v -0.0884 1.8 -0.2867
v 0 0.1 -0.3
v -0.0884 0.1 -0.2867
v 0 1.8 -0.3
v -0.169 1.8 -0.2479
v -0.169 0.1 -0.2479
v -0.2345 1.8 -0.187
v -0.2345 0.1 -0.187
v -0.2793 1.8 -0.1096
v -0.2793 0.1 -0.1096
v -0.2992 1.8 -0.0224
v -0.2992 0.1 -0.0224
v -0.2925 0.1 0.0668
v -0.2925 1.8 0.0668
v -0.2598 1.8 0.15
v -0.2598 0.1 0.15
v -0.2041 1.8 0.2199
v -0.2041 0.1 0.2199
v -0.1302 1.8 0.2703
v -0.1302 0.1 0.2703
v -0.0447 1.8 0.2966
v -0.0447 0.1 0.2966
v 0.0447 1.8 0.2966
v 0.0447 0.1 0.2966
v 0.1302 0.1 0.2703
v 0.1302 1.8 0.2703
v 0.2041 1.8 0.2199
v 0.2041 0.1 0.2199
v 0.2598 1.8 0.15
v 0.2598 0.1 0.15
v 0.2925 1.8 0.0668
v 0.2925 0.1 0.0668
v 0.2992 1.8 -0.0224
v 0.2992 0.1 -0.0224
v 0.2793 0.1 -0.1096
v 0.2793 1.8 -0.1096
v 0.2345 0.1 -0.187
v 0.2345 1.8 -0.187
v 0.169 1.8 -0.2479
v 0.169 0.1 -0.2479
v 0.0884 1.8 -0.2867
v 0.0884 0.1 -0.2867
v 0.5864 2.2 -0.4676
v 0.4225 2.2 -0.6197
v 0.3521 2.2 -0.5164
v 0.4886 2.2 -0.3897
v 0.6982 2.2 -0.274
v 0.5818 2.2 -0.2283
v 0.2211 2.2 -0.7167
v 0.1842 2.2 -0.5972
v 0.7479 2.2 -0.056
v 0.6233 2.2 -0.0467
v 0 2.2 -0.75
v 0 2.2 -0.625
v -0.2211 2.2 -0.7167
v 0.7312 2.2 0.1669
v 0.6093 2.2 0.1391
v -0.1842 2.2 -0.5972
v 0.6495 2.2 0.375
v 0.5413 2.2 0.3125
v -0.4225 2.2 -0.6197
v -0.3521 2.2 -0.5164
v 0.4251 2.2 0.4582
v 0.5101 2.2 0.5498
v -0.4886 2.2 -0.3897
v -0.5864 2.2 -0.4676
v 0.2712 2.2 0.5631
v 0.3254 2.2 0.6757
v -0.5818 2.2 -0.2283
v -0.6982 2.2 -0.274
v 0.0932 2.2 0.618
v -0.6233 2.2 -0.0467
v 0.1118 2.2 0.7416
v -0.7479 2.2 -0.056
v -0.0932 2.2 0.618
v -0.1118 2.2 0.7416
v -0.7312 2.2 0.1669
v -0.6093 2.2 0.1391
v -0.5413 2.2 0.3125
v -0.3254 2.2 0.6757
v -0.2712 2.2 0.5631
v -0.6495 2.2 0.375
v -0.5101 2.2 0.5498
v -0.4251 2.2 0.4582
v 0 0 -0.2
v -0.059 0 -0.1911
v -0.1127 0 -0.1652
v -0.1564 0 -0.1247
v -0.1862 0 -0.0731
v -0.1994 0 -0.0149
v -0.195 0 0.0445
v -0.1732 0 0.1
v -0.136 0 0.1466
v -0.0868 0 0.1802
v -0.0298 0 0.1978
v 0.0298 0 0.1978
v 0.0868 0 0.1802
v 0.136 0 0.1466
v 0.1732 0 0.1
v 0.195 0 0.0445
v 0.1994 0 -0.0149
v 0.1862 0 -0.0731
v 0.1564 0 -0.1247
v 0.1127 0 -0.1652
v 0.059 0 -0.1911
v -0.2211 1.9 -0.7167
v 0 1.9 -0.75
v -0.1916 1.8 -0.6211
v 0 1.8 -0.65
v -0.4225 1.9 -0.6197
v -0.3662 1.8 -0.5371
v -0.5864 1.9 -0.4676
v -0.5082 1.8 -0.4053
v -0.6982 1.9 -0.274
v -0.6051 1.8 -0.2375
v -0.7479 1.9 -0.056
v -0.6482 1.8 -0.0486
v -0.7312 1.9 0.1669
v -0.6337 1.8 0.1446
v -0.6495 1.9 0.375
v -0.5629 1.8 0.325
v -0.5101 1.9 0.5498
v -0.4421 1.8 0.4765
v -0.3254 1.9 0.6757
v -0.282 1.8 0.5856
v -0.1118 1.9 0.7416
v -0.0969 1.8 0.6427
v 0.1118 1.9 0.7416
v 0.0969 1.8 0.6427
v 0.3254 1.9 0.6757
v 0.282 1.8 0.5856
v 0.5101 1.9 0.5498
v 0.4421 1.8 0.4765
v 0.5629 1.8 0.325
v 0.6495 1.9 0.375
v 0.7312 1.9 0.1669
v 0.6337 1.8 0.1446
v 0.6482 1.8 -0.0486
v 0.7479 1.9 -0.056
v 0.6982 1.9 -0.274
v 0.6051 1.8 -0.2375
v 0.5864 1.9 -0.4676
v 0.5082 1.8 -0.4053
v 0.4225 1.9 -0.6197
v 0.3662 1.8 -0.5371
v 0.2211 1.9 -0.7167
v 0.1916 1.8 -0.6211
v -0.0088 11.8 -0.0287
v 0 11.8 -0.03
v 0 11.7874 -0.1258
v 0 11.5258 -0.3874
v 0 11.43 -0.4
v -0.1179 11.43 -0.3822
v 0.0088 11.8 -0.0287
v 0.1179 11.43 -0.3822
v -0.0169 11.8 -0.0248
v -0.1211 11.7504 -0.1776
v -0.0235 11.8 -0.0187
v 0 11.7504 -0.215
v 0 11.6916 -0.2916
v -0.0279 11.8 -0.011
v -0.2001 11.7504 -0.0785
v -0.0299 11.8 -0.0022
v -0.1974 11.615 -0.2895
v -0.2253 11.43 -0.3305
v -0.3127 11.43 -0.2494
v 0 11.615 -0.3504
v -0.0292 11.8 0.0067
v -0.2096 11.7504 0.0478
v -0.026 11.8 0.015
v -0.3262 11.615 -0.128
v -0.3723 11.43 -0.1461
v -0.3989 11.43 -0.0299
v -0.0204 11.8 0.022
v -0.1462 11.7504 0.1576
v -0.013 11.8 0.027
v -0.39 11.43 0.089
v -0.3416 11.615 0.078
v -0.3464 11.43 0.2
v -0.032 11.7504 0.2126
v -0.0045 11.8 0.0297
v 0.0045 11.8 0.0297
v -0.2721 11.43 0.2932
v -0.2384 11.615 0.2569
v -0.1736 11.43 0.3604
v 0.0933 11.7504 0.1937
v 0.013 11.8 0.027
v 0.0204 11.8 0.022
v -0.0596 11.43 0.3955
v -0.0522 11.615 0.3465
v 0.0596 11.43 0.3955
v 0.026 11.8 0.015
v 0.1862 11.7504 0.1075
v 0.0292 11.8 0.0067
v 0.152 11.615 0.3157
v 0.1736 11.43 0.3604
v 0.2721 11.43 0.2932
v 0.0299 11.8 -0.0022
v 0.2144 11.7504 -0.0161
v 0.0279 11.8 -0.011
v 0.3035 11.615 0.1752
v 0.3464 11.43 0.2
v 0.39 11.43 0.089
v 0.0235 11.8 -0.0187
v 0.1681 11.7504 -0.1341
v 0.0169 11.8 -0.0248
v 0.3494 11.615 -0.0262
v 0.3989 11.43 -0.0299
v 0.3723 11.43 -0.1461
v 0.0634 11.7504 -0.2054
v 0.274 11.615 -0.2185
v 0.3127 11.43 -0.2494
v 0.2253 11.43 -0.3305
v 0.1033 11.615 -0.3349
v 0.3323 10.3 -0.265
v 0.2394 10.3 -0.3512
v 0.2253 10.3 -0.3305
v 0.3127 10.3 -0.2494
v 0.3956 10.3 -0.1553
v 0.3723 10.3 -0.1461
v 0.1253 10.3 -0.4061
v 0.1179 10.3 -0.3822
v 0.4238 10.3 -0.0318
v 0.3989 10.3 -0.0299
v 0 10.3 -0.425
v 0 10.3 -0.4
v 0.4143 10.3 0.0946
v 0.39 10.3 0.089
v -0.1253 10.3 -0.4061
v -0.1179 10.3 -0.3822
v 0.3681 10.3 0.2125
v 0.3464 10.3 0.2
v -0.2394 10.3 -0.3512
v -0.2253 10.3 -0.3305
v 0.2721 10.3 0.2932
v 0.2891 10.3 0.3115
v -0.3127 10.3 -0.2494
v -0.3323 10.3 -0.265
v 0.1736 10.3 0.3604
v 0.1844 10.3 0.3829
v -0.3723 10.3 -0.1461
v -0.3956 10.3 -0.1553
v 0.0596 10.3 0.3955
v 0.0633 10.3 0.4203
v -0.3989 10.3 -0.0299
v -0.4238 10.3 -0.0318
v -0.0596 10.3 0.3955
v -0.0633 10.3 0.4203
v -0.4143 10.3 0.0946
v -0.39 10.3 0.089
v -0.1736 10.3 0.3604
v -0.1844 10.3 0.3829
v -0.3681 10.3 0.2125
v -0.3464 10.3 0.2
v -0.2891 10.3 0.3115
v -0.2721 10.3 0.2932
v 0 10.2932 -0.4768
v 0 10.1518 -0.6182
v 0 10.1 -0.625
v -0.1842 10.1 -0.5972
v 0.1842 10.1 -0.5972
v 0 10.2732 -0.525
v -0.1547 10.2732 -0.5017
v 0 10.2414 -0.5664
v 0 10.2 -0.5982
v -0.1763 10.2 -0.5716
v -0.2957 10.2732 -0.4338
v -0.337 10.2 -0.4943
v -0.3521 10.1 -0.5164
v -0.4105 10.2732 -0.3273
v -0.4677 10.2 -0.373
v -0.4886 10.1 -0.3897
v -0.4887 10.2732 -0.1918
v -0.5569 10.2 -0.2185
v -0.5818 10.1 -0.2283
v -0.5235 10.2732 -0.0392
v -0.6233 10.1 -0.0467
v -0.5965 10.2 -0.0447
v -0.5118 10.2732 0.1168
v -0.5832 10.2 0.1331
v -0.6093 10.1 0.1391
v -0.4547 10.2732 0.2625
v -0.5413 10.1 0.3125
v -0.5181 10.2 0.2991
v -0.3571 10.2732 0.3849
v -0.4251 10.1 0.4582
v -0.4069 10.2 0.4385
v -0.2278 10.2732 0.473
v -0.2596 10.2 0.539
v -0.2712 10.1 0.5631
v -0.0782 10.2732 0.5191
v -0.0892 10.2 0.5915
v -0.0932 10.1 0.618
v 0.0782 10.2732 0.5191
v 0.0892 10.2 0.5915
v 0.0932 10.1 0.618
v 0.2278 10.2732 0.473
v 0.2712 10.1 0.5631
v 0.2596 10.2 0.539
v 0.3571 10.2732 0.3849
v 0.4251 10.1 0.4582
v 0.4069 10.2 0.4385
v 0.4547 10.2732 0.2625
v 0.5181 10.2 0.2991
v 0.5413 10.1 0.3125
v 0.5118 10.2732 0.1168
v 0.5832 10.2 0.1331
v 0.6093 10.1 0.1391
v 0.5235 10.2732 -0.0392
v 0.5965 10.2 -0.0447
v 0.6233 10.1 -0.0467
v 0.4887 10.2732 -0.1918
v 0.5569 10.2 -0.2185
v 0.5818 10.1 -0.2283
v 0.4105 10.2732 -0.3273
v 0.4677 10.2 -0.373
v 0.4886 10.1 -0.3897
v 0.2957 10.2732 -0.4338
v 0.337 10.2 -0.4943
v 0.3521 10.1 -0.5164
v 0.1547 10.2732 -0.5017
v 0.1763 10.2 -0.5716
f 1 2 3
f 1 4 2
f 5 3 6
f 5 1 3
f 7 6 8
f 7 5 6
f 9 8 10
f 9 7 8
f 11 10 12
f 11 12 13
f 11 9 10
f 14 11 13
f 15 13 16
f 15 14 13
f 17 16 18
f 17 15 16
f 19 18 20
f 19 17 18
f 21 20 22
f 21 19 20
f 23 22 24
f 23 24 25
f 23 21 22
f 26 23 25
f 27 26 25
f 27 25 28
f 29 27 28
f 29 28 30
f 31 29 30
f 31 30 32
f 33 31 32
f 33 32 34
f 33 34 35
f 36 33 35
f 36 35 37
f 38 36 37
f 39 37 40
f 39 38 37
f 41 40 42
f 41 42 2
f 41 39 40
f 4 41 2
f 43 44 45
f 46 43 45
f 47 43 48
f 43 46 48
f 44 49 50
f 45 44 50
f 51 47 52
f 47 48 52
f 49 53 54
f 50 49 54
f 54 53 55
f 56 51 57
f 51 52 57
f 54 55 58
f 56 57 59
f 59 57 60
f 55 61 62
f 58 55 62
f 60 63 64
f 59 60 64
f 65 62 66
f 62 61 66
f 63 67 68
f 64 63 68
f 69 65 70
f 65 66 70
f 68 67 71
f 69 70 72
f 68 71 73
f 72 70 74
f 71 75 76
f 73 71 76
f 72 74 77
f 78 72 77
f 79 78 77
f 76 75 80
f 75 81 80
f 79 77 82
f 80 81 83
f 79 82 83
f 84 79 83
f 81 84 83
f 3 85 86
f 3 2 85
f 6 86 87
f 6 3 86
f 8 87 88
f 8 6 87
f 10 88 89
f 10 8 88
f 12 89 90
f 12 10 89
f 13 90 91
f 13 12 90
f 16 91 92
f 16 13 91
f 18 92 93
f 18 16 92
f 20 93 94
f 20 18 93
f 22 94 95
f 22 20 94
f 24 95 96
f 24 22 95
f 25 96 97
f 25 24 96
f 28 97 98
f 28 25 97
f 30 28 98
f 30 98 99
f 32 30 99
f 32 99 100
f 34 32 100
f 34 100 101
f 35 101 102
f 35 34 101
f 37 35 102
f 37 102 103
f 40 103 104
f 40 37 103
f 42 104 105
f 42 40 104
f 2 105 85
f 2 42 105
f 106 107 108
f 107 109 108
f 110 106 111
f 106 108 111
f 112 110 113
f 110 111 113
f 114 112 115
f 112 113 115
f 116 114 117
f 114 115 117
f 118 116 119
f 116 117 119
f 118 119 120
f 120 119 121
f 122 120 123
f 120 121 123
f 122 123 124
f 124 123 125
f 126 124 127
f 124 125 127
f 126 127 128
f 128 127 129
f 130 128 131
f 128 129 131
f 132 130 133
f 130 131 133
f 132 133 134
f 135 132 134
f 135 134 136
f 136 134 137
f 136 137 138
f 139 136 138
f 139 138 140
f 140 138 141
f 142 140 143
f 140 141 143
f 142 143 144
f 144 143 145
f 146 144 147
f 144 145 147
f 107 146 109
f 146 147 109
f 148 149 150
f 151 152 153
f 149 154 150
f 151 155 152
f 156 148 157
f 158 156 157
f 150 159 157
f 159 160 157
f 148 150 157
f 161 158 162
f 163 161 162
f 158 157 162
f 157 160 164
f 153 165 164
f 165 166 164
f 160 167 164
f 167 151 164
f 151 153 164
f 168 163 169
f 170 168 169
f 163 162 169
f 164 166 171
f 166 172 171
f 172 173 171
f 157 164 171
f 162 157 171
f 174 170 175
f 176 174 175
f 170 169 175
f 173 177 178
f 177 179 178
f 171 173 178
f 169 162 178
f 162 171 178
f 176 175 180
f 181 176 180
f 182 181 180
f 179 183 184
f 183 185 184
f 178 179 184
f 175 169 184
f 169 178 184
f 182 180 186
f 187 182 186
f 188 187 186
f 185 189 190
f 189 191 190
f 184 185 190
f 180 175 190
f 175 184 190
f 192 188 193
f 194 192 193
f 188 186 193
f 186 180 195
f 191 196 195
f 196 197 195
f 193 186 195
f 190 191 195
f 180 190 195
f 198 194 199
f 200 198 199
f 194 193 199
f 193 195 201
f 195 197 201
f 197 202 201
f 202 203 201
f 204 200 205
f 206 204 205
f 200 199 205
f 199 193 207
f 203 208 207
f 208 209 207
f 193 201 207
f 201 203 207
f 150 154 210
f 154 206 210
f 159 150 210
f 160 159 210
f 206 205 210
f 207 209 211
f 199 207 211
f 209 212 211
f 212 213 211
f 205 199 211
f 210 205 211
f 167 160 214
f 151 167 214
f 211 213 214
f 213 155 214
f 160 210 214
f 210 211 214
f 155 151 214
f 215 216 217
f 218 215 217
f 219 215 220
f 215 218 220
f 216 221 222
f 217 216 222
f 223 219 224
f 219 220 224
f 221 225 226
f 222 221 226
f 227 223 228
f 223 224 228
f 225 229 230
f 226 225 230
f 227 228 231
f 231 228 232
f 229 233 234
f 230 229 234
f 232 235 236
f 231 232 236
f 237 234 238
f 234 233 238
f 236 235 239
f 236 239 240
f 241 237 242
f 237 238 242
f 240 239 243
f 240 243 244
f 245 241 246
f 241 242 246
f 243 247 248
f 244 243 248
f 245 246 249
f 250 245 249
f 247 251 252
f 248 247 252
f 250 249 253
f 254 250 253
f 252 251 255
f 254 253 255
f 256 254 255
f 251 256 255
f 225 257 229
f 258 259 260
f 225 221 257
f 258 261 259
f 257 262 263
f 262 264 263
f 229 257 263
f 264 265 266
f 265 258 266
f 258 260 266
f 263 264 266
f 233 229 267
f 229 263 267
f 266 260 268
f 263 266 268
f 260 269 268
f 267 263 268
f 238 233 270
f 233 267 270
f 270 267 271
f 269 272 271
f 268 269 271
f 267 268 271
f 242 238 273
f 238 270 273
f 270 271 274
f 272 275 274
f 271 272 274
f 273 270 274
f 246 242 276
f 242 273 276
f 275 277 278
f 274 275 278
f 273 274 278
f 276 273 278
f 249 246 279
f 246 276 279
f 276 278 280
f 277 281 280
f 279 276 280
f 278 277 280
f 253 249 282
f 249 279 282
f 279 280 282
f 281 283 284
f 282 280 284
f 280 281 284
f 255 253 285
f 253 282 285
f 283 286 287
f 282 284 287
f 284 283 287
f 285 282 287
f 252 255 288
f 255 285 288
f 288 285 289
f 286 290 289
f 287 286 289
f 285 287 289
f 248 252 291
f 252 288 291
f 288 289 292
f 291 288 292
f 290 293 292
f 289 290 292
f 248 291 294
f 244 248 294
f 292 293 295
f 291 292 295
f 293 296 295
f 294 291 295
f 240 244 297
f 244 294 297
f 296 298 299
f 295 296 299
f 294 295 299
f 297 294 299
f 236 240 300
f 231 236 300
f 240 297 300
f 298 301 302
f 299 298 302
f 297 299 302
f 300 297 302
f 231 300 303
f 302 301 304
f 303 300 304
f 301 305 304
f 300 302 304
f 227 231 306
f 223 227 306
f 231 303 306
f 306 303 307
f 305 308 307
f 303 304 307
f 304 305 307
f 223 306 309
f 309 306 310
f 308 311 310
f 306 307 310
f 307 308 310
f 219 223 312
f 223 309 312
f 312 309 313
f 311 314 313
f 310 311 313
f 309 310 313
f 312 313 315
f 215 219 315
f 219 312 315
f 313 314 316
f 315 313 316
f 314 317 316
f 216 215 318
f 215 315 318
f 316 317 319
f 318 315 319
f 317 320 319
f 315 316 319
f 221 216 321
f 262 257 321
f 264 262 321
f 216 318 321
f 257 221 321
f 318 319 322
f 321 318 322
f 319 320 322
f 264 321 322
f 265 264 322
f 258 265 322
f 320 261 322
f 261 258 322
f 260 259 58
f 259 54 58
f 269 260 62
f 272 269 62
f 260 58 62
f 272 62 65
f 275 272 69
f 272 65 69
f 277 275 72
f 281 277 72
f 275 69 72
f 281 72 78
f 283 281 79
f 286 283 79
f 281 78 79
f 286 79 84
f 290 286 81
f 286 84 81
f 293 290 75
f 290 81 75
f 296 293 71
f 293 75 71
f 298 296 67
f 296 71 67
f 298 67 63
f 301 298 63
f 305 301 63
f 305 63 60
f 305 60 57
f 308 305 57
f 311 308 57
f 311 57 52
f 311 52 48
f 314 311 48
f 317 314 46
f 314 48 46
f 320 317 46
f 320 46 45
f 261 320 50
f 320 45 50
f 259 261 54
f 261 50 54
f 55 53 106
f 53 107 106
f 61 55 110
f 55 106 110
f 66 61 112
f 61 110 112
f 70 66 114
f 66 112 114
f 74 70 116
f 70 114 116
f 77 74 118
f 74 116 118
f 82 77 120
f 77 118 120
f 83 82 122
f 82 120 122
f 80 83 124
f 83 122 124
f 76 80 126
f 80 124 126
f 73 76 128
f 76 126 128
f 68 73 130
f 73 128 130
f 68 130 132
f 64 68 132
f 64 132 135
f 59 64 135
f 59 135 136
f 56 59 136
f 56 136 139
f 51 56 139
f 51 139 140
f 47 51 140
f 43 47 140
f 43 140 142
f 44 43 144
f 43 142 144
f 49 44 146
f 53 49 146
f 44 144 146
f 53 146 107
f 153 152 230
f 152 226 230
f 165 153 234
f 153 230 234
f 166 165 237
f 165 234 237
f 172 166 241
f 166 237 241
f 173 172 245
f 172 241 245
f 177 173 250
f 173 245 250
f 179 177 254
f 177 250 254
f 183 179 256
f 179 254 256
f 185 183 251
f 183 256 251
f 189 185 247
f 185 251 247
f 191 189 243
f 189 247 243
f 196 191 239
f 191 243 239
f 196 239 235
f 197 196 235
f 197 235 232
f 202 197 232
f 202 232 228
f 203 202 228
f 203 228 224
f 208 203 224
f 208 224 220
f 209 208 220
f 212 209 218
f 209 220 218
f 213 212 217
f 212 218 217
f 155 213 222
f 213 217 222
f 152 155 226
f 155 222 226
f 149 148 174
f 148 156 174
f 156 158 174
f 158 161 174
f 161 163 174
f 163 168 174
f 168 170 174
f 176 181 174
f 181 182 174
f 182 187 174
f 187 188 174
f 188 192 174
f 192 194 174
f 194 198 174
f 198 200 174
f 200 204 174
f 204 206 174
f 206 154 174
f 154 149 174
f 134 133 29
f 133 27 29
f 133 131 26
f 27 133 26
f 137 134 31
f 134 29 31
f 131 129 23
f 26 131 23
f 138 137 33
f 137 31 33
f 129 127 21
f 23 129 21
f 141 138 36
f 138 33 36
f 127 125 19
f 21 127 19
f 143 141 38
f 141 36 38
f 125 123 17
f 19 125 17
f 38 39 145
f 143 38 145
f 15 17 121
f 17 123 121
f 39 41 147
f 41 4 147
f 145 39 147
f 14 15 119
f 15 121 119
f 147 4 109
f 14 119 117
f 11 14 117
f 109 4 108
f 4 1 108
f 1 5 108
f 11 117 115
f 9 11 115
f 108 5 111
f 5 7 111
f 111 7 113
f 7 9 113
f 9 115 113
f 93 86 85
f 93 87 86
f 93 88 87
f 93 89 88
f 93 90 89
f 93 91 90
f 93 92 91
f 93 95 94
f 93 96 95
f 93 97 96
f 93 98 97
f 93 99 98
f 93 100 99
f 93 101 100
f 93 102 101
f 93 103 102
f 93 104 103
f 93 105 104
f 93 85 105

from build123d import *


with BuildPart() as part:
    # Эскиз1 → Повернуть1 (revolve)
    with BuildSketch(Plane(origin=(0, 0, 0), x_dir=(0, 0, -1), z_dir=(1, 0, 0)), mode=Mode.PRIVATE) as revolve_1_sk:
        Polygon((-0.3, 0.1), (-0.3, 1.8), (0, 1.8), (0, 0), (-0.2, 0), align=None)
        Polygon((-0.65, 1.8), (-0.3, 1.8), (0, 1.8), (0, 2.2), (-0.625, 2.2), (-0.75, 2.2), (-0.75, 1.9), align=None)
        with BuildLine():
            Line((-0.625, 2.2), (0, 2.2))
            Line((0, 2.2), (0, 10.3))
            Line((0, 10.3), (-0.4, 10.3))
            Line((-0.4, 10.3), (-0.425, 10.3))
            ThreePointArc((-0.425, 10.3), (-0.566421356, 10.241421356), (-0.625, 10.1))
            Line((-0.625, 10.1), (-0.625, 2.2))
        make_face()
        with BuildLine():
            Line((-0.4, 10.3), (0, 10.3))
            Line((0, 10.3), (0, 11.8))
            Line((0, 11.8), (-0.03, 11.8))
            ThreePointArc((-0.03, 11.8), (-0.291629509, 11.691629509), (-0.4, 11.43))
            Line((-0.4, 11.43), (-0.4, 10.3))
        make_face()
    revolve(revolve_1_sk.sketch.rotate(Axis((0, 0, 0), (0, 1, 0)), 180), axis=Axis((0, 0, 0), (0, 1, 0)))


solid = part.part
